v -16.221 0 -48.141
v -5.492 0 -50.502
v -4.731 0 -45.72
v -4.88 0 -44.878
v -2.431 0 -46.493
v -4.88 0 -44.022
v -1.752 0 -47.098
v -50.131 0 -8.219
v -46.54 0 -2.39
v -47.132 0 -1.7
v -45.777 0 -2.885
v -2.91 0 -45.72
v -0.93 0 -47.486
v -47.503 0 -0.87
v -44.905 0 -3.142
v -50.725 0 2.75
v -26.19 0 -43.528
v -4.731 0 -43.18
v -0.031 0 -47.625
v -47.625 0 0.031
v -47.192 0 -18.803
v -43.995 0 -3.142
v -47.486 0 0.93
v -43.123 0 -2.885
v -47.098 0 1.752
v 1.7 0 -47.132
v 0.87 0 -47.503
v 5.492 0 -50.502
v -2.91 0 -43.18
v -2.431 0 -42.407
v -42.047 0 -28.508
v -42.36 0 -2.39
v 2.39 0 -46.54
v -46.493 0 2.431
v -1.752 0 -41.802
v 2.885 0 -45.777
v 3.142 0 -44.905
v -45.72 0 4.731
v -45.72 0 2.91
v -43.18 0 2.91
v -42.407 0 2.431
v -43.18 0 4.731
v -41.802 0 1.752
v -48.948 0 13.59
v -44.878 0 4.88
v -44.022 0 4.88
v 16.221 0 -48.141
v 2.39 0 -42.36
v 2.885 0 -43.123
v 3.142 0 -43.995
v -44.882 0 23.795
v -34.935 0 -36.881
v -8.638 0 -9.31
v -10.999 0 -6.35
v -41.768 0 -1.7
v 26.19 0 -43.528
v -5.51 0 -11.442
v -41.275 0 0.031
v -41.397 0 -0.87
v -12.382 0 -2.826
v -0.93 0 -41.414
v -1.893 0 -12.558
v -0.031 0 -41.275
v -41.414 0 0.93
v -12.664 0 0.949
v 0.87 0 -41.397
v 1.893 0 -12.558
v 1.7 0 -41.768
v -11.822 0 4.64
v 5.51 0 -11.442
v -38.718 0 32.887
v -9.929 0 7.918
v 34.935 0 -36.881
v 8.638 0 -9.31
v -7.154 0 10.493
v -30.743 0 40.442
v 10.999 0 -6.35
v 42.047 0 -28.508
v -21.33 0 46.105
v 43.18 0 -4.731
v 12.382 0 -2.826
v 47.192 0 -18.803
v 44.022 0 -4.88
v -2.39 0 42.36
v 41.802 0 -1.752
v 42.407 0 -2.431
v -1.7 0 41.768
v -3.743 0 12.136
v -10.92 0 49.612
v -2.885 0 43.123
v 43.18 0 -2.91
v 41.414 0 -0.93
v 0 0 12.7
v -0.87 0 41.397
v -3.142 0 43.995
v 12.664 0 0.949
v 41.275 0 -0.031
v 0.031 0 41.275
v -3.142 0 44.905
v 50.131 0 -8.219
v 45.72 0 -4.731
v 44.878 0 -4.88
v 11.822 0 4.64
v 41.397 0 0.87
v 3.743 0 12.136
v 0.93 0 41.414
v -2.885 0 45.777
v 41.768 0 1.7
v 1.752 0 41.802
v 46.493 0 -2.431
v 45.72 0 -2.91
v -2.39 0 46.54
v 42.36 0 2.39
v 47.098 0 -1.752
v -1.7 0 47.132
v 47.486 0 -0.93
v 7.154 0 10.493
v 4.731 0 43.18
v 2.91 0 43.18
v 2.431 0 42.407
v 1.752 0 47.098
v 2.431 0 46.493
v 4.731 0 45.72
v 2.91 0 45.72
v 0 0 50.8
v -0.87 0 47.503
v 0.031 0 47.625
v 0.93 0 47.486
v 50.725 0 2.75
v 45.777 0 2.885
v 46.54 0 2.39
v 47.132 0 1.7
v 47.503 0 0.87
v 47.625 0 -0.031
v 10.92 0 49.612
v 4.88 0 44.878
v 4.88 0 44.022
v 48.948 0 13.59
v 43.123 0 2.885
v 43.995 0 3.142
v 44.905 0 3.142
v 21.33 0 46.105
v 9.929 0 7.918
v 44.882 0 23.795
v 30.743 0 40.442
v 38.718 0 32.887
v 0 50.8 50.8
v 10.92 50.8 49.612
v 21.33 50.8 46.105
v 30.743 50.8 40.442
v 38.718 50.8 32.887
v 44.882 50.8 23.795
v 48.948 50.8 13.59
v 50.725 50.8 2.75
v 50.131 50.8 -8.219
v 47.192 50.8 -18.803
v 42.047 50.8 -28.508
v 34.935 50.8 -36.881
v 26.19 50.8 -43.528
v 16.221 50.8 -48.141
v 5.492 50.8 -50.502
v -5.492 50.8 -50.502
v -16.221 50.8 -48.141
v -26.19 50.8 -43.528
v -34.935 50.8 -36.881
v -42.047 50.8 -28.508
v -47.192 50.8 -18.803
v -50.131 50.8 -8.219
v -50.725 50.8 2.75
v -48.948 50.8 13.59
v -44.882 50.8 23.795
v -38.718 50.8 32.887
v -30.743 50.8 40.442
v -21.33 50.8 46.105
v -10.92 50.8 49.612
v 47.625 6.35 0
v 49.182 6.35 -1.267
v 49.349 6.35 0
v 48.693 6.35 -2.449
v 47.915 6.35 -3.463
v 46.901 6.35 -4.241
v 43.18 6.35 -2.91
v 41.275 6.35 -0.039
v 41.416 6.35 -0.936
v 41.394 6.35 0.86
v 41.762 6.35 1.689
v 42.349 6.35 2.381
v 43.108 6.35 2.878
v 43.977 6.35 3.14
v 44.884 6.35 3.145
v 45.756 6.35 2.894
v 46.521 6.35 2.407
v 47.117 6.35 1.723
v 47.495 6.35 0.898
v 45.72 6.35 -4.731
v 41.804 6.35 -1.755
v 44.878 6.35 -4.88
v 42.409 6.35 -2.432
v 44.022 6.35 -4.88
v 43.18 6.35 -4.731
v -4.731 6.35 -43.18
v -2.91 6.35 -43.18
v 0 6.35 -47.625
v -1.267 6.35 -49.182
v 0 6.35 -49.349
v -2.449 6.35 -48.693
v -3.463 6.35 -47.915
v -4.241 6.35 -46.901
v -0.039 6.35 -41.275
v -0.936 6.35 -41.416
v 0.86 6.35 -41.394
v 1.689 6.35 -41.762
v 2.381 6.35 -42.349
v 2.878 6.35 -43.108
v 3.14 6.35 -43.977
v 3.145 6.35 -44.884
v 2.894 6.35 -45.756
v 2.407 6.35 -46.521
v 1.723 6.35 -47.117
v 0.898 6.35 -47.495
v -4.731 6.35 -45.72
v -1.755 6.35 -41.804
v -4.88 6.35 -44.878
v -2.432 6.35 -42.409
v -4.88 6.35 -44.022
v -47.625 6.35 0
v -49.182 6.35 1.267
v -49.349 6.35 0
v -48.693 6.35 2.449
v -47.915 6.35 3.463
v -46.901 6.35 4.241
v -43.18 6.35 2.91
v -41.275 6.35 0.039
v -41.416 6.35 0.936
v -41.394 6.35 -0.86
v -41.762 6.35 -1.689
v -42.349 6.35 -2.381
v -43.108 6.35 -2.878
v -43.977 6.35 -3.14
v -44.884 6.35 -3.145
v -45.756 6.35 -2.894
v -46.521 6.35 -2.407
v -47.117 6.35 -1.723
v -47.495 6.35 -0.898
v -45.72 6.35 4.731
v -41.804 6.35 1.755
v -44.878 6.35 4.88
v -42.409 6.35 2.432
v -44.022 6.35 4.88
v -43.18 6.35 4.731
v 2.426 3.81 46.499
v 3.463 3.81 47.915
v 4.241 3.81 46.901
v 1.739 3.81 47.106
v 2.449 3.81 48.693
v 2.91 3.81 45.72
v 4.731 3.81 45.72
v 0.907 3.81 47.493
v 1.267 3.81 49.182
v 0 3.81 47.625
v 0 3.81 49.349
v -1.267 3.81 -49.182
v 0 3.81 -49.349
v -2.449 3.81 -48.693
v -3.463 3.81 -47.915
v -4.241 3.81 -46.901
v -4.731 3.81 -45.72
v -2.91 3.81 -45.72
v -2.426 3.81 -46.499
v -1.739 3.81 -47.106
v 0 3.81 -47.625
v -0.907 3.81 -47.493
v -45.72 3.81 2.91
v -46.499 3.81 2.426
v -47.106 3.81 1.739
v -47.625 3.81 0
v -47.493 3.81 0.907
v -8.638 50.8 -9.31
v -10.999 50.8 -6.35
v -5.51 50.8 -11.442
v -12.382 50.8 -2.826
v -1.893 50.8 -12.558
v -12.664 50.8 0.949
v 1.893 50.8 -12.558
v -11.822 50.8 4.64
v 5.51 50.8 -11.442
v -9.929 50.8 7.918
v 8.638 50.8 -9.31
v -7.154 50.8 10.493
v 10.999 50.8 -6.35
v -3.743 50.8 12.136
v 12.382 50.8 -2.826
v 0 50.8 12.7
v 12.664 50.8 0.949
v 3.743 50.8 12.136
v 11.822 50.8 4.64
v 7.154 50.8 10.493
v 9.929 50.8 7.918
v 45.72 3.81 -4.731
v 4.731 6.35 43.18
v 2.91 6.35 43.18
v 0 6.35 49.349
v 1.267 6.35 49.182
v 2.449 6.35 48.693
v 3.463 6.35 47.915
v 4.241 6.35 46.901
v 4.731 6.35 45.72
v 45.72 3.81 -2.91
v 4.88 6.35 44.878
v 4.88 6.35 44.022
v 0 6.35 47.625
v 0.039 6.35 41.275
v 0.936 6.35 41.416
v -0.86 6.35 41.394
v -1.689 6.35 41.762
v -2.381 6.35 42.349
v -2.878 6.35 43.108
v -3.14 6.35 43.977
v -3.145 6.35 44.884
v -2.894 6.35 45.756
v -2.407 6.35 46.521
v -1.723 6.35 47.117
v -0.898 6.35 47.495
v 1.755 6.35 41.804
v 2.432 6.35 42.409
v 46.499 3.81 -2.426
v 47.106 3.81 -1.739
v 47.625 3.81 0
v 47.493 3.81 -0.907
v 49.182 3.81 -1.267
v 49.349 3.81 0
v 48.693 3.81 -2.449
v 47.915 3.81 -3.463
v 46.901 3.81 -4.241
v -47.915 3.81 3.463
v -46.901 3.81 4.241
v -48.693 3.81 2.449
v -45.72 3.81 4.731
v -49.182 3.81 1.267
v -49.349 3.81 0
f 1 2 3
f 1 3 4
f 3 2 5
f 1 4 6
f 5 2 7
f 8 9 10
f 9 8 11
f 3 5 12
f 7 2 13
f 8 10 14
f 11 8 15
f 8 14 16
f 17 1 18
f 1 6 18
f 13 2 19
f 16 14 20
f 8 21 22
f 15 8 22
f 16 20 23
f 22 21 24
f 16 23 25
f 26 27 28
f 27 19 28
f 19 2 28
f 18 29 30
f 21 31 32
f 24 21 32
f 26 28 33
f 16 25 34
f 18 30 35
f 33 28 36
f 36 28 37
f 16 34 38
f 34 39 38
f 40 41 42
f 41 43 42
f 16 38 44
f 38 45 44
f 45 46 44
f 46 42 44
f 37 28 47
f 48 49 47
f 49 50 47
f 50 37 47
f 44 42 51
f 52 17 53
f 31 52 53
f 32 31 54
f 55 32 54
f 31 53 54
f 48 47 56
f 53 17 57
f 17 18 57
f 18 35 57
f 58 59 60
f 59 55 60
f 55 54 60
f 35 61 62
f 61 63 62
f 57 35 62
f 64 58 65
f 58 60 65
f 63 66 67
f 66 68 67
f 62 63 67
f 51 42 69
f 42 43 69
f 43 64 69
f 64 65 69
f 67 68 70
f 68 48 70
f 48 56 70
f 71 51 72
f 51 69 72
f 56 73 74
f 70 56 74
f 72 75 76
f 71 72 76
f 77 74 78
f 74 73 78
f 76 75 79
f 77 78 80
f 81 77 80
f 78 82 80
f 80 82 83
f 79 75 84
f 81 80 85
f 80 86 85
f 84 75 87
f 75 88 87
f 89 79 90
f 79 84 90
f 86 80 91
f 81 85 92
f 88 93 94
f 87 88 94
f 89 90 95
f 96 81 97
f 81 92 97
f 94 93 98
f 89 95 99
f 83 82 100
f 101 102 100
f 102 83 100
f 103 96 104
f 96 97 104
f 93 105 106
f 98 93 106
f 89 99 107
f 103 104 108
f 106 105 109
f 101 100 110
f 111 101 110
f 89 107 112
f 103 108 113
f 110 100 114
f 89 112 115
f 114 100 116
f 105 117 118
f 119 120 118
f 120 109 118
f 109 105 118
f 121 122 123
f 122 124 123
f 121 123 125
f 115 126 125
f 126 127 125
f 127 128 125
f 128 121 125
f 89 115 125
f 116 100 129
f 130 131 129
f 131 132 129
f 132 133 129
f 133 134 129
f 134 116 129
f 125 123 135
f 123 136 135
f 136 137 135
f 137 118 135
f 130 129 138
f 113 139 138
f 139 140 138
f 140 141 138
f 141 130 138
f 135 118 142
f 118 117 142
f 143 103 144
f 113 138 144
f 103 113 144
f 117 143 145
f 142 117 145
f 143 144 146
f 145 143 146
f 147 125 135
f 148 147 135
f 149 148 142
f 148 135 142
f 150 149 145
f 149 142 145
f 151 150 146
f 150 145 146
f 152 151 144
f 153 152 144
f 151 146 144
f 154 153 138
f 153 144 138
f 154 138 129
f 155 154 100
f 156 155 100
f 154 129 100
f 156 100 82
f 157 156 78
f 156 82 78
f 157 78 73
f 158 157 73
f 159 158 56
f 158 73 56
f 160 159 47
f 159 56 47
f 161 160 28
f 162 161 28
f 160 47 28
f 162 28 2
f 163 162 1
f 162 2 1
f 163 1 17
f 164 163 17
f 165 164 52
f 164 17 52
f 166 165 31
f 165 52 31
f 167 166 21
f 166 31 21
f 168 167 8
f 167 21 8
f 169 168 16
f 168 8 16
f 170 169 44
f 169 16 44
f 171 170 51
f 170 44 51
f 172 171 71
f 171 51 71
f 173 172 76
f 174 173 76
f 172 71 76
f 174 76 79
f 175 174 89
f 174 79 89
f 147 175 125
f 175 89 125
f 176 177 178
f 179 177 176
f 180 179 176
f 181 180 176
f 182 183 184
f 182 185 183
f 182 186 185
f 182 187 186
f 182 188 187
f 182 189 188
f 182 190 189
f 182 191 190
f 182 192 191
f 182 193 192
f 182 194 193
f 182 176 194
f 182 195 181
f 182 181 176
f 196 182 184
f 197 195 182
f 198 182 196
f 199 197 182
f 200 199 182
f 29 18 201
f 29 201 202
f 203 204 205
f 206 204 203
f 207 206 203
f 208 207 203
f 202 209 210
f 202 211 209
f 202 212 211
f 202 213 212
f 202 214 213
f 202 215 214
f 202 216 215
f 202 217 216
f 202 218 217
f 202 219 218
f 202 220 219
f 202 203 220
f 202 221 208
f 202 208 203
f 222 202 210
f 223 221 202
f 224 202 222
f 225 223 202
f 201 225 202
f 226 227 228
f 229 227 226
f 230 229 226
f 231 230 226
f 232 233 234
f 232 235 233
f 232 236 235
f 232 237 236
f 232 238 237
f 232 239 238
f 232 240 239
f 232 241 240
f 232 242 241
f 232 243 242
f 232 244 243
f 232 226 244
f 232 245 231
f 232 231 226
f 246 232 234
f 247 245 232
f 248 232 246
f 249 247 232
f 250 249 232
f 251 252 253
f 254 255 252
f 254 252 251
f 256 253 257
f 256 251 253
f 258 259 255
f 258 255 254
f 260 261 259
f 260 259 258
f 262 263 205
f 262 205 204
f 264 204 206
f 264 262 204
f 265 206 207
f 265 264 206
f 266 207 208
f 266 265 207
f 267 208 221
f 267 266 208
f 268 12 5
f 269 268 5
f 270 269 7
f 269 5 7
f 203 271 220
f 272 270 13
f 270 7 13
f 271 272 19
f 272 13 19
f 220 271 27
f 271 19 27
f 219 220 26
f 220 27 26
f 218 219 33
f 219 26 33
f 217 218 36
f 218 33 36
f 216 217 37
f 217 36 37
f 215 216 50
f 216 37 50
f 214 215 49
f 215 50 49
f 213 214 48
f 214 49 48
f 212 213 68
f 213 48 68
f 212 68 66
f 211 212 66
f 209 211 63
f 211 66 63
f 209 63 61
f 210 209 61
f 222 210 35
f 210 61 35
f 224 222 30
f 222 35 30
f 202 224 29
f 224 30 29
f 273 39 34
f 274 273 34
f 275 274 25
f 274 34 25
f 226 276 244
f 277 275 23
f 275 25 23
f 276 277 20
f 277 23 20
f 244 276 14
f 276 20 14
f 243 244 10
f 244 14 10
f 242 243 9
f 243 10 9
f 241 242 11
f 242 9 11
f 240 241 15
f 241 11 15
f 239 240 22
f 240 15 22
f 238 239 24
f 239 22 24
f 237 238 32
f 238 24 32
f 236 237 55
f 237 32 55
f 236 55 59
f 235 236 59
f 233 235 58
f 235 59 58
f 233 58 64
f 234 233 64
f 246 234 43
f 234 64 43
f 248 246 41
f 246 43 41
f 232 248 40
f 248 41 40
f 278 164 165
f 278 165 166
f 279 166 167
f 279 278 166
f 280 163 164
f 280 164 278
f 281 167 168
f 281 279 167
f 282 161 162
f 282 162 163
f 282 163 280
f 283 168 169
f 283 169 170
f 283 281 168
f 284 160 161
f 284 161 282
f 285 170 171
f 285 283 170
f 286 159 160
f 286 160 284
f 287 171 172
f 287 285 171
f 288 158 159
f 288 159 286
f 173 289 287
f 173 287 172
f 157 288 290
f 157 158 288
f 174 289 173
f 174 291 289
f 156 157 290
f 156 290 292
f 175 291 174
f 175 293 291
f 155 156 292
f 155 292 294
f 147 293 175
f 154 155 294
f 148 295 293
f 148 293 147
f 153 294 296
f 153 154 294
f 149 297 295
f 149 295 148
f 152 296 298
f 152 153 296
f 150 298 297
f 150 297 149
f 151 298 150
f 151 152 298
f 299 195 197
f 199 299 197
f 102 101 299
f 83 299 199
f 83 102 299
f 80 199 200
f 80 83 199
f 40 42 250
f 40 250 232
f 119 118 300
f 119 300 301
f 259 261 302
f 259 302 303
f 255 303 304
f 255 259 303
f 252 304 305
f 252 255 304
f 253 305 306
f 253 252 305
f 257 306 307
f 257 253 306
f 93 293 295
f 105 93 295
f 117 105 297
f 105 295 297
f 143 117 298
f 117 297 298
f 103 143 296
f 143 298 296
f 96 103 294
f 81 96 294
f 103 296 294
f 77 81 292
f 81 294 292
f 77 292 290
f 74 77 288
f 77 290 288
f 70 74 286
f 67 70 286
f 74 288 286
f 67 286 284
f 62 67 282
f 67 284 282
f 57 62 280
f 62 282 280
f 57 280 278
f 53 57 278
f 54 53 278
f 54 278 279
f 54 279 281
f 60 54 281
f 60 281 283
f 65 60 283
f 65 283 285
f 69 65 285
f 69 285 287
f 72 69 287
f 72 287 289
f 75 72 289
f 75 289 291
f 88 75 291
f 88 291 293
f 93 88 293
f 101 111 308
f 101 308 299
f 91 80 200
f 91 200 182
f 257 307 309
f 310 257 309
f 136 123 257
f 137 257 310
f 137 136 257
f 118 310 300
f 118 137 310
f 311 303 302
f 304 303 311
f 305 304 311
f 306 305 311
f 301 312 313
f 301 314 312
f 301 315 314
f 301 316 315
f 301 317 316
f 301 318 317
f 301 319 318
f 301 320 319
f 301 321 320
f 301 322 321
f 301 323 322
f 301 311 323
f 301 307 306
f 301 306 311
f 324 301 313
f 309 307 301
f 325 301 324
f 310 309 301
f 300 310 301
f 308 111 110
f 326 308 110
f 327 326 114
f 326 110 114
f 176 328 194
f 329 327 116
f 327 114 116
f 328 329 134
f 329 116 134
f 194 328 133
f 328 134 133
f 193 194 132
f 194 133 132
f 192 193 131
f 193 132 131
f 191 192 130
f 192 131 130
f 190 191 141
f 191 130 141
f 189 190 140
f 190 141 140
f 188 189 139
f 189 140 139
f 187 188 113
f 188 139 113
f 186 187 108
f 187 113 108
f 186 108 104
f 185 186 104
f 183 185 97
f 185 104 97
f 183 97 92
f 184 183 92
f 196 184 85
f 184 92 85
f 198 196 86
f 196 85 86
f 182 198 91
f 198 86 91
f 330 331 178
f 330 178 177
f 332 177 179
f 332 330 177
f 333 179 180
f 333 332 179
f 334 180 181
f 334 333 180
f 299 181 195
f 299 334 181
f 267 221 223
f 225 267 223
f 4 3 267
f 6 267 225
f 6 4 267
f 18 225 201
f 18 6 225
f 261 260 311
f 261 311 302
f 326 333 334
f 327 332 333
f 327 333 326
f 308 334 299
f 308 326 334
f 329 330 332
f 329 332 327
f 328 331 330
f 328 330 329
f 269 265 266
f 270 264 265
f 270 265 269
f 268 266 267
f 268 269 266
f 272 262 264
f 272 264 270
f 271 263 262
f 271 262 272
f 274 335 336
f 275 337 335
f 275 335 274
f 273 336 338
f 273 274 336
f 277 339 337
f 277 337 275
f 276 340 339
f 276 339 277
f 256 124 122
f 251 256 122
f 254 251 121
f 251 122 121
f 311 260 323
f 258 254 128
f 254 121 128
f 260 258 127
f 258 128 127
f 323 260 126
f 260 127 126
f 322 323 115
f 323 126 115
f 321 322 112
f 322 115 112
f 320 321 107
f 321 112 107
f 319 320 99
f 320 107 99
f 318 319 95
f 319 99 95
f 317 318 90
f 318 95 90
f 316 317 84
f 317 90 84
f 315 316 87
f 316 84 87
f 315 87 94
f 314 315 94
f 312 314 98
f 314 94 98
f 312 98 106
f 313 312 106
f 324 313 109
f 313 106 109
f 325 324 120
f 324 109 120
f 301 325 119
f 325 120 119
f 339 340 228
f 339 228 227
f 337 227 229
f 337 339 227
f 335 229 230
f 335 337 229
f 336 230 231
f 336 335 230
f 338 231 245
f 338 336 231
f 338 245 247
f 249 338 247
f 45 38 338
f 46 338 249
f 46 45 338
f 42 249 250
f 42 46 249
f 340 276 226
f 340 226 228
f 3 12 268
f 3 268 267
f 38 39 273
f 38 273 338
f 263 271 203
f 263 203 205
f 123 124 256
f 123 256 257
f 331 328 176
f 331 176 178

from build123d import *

# Parameters (mm, degrees)
SKETCH1_R           = 50.8
BOSS_EXTRUDE1_DEPTH = 50.8
SKETCH3_R           = 3.175
CUT_EXTRUDE1_DEPTH  = 6.35
CIRPATTERN1_COUNT   = 4
CUT_EXTRUDE2_DEPTH  = 6.35
CUT_EXTRUDE3_START  = 2.54
CUT_EXTRUDE3_DEPTH  = 2.54
CIRPATTERN2_COUNT   = 4
SKETCH6_R           = 12.7
CUT_EXTRUDE4_DEPTH  = 88.988181024


with BuildPart() as part:
    # Sketch1 → Boss-Extrude1 (new body)
    with BuildSketch(Plane(origin=(0, 0, 0), x_dir=(1, 0, 0), z_dir=(0, 1, 0))):
        with Locations(Location((0, 0, 0), (0, 0, 270))):
            Circle(SKETCH1_R)
    extrude(amount=BOSS_EXTRUDE1_DEPTH)

    # Sketch3 → Cut-Extrude1 (cut)
    with BuildSketch(Plane.XZ):
        with Locations(Location((0, 44.45, 0), (0, 0, 270))):
            Circle(SKETCH3_R)
    cut_extrude1 = extrude(amount=-CUT_EXTRUDE1_DEPTH, mode=Mode.SUBTRACT)

    # CirPattern1: Cut-Extrude1 ×4 about axis
    cirpattern1_axis = Axis((0, 0, 0), (0, 1, 0))
    for i in range(1, CIRPATTERN1_COUNT):
        add(cut_extrude1.rotate(cirpattern1_axis, i * 360 / CIRPATTERN1_COUNT), mode=Mode.SUBTRACT)

    # Sketch4 → Cut-Extrude2 (cut)
    with BuildSketch(Plane.XZ):
        with BuildLine():
            Line((43.18, -4.731127947), (43.18, -2.909935566))
            ThreePointArc((43.18, -2.909935566), (44.45, -3.175), (45.72, -2.909935566))
            Line((45.72, -2.909935566), (45.72, -4.731127947))
            ThreePointArc((45.72, -4.731127947), (44.45, -4.898619361), (43.18, -4.731127947))
        make_face()
    cut_extrude2 = extrude(amount=-CUT_EXTRUDE2_DEPTH, mode=Mode.SUBTRACT)

    # Sketch5 → Cut-Extrude3 (cut)
    with BuildSketch(Plane.XZ.offset(-6.35).offset(CUT_EXTRUDE3_START)):
        with BuildLine():
            Line((47.625, 0), (49.348619361, 0))
            ThreePointArc((49.348619361, 0), (48.337011592, -2.98120991), (45.72, -4.731127947))
            Line((45.72, -4.731127947), (45.72, -2.909935566))
            ThreePointArc((45.72, -2.909935566), (47.106395584, -1.73901912), (47.625, 0))
        make_face()
    cut_extrude3 = extrude(amount=-CUT_EXTRUDE3_DEPTH, mode=Mode.SUBTRACT)

    # CirPattern2: Cut-Extrude2, Cut-Extrude3 ×4 about axis
    cirpattern2_axis = Axis((0, 0, 0), (0, 1, 0))
    add([cut_extrude2.rotate(cirpattern2_axis, i * 360 / CIRPATTERN2_COUNT) for i in range(1, CIRPATTERN2_COUNT)], mode=Mode.SUBTRACT)
    add([cut_extrude3.rotate(cirpattern2_axis, i * 360 / CIRPATTERN2_COUNT) for i in range(1, CIRPATTERN2_COUNT)], mode=Mode.SUBTRACT)

    # Sketch6 → Cut-Extrude4 (cut, through all)
    with BuildSketch(Plane(origin=(0, 50.8, 0), x_dir=(1, 0, 0), z_dir=(0, 1, 0))):
        with Locations(Location((0, 0, 0), (0, 0, 270))):
            Circle(SKETCH6_R)
    extrude(amount=-CUT_EXTRUDE4_DEPTH, mode=Mode.SUBTRACT)


solid = part.part
